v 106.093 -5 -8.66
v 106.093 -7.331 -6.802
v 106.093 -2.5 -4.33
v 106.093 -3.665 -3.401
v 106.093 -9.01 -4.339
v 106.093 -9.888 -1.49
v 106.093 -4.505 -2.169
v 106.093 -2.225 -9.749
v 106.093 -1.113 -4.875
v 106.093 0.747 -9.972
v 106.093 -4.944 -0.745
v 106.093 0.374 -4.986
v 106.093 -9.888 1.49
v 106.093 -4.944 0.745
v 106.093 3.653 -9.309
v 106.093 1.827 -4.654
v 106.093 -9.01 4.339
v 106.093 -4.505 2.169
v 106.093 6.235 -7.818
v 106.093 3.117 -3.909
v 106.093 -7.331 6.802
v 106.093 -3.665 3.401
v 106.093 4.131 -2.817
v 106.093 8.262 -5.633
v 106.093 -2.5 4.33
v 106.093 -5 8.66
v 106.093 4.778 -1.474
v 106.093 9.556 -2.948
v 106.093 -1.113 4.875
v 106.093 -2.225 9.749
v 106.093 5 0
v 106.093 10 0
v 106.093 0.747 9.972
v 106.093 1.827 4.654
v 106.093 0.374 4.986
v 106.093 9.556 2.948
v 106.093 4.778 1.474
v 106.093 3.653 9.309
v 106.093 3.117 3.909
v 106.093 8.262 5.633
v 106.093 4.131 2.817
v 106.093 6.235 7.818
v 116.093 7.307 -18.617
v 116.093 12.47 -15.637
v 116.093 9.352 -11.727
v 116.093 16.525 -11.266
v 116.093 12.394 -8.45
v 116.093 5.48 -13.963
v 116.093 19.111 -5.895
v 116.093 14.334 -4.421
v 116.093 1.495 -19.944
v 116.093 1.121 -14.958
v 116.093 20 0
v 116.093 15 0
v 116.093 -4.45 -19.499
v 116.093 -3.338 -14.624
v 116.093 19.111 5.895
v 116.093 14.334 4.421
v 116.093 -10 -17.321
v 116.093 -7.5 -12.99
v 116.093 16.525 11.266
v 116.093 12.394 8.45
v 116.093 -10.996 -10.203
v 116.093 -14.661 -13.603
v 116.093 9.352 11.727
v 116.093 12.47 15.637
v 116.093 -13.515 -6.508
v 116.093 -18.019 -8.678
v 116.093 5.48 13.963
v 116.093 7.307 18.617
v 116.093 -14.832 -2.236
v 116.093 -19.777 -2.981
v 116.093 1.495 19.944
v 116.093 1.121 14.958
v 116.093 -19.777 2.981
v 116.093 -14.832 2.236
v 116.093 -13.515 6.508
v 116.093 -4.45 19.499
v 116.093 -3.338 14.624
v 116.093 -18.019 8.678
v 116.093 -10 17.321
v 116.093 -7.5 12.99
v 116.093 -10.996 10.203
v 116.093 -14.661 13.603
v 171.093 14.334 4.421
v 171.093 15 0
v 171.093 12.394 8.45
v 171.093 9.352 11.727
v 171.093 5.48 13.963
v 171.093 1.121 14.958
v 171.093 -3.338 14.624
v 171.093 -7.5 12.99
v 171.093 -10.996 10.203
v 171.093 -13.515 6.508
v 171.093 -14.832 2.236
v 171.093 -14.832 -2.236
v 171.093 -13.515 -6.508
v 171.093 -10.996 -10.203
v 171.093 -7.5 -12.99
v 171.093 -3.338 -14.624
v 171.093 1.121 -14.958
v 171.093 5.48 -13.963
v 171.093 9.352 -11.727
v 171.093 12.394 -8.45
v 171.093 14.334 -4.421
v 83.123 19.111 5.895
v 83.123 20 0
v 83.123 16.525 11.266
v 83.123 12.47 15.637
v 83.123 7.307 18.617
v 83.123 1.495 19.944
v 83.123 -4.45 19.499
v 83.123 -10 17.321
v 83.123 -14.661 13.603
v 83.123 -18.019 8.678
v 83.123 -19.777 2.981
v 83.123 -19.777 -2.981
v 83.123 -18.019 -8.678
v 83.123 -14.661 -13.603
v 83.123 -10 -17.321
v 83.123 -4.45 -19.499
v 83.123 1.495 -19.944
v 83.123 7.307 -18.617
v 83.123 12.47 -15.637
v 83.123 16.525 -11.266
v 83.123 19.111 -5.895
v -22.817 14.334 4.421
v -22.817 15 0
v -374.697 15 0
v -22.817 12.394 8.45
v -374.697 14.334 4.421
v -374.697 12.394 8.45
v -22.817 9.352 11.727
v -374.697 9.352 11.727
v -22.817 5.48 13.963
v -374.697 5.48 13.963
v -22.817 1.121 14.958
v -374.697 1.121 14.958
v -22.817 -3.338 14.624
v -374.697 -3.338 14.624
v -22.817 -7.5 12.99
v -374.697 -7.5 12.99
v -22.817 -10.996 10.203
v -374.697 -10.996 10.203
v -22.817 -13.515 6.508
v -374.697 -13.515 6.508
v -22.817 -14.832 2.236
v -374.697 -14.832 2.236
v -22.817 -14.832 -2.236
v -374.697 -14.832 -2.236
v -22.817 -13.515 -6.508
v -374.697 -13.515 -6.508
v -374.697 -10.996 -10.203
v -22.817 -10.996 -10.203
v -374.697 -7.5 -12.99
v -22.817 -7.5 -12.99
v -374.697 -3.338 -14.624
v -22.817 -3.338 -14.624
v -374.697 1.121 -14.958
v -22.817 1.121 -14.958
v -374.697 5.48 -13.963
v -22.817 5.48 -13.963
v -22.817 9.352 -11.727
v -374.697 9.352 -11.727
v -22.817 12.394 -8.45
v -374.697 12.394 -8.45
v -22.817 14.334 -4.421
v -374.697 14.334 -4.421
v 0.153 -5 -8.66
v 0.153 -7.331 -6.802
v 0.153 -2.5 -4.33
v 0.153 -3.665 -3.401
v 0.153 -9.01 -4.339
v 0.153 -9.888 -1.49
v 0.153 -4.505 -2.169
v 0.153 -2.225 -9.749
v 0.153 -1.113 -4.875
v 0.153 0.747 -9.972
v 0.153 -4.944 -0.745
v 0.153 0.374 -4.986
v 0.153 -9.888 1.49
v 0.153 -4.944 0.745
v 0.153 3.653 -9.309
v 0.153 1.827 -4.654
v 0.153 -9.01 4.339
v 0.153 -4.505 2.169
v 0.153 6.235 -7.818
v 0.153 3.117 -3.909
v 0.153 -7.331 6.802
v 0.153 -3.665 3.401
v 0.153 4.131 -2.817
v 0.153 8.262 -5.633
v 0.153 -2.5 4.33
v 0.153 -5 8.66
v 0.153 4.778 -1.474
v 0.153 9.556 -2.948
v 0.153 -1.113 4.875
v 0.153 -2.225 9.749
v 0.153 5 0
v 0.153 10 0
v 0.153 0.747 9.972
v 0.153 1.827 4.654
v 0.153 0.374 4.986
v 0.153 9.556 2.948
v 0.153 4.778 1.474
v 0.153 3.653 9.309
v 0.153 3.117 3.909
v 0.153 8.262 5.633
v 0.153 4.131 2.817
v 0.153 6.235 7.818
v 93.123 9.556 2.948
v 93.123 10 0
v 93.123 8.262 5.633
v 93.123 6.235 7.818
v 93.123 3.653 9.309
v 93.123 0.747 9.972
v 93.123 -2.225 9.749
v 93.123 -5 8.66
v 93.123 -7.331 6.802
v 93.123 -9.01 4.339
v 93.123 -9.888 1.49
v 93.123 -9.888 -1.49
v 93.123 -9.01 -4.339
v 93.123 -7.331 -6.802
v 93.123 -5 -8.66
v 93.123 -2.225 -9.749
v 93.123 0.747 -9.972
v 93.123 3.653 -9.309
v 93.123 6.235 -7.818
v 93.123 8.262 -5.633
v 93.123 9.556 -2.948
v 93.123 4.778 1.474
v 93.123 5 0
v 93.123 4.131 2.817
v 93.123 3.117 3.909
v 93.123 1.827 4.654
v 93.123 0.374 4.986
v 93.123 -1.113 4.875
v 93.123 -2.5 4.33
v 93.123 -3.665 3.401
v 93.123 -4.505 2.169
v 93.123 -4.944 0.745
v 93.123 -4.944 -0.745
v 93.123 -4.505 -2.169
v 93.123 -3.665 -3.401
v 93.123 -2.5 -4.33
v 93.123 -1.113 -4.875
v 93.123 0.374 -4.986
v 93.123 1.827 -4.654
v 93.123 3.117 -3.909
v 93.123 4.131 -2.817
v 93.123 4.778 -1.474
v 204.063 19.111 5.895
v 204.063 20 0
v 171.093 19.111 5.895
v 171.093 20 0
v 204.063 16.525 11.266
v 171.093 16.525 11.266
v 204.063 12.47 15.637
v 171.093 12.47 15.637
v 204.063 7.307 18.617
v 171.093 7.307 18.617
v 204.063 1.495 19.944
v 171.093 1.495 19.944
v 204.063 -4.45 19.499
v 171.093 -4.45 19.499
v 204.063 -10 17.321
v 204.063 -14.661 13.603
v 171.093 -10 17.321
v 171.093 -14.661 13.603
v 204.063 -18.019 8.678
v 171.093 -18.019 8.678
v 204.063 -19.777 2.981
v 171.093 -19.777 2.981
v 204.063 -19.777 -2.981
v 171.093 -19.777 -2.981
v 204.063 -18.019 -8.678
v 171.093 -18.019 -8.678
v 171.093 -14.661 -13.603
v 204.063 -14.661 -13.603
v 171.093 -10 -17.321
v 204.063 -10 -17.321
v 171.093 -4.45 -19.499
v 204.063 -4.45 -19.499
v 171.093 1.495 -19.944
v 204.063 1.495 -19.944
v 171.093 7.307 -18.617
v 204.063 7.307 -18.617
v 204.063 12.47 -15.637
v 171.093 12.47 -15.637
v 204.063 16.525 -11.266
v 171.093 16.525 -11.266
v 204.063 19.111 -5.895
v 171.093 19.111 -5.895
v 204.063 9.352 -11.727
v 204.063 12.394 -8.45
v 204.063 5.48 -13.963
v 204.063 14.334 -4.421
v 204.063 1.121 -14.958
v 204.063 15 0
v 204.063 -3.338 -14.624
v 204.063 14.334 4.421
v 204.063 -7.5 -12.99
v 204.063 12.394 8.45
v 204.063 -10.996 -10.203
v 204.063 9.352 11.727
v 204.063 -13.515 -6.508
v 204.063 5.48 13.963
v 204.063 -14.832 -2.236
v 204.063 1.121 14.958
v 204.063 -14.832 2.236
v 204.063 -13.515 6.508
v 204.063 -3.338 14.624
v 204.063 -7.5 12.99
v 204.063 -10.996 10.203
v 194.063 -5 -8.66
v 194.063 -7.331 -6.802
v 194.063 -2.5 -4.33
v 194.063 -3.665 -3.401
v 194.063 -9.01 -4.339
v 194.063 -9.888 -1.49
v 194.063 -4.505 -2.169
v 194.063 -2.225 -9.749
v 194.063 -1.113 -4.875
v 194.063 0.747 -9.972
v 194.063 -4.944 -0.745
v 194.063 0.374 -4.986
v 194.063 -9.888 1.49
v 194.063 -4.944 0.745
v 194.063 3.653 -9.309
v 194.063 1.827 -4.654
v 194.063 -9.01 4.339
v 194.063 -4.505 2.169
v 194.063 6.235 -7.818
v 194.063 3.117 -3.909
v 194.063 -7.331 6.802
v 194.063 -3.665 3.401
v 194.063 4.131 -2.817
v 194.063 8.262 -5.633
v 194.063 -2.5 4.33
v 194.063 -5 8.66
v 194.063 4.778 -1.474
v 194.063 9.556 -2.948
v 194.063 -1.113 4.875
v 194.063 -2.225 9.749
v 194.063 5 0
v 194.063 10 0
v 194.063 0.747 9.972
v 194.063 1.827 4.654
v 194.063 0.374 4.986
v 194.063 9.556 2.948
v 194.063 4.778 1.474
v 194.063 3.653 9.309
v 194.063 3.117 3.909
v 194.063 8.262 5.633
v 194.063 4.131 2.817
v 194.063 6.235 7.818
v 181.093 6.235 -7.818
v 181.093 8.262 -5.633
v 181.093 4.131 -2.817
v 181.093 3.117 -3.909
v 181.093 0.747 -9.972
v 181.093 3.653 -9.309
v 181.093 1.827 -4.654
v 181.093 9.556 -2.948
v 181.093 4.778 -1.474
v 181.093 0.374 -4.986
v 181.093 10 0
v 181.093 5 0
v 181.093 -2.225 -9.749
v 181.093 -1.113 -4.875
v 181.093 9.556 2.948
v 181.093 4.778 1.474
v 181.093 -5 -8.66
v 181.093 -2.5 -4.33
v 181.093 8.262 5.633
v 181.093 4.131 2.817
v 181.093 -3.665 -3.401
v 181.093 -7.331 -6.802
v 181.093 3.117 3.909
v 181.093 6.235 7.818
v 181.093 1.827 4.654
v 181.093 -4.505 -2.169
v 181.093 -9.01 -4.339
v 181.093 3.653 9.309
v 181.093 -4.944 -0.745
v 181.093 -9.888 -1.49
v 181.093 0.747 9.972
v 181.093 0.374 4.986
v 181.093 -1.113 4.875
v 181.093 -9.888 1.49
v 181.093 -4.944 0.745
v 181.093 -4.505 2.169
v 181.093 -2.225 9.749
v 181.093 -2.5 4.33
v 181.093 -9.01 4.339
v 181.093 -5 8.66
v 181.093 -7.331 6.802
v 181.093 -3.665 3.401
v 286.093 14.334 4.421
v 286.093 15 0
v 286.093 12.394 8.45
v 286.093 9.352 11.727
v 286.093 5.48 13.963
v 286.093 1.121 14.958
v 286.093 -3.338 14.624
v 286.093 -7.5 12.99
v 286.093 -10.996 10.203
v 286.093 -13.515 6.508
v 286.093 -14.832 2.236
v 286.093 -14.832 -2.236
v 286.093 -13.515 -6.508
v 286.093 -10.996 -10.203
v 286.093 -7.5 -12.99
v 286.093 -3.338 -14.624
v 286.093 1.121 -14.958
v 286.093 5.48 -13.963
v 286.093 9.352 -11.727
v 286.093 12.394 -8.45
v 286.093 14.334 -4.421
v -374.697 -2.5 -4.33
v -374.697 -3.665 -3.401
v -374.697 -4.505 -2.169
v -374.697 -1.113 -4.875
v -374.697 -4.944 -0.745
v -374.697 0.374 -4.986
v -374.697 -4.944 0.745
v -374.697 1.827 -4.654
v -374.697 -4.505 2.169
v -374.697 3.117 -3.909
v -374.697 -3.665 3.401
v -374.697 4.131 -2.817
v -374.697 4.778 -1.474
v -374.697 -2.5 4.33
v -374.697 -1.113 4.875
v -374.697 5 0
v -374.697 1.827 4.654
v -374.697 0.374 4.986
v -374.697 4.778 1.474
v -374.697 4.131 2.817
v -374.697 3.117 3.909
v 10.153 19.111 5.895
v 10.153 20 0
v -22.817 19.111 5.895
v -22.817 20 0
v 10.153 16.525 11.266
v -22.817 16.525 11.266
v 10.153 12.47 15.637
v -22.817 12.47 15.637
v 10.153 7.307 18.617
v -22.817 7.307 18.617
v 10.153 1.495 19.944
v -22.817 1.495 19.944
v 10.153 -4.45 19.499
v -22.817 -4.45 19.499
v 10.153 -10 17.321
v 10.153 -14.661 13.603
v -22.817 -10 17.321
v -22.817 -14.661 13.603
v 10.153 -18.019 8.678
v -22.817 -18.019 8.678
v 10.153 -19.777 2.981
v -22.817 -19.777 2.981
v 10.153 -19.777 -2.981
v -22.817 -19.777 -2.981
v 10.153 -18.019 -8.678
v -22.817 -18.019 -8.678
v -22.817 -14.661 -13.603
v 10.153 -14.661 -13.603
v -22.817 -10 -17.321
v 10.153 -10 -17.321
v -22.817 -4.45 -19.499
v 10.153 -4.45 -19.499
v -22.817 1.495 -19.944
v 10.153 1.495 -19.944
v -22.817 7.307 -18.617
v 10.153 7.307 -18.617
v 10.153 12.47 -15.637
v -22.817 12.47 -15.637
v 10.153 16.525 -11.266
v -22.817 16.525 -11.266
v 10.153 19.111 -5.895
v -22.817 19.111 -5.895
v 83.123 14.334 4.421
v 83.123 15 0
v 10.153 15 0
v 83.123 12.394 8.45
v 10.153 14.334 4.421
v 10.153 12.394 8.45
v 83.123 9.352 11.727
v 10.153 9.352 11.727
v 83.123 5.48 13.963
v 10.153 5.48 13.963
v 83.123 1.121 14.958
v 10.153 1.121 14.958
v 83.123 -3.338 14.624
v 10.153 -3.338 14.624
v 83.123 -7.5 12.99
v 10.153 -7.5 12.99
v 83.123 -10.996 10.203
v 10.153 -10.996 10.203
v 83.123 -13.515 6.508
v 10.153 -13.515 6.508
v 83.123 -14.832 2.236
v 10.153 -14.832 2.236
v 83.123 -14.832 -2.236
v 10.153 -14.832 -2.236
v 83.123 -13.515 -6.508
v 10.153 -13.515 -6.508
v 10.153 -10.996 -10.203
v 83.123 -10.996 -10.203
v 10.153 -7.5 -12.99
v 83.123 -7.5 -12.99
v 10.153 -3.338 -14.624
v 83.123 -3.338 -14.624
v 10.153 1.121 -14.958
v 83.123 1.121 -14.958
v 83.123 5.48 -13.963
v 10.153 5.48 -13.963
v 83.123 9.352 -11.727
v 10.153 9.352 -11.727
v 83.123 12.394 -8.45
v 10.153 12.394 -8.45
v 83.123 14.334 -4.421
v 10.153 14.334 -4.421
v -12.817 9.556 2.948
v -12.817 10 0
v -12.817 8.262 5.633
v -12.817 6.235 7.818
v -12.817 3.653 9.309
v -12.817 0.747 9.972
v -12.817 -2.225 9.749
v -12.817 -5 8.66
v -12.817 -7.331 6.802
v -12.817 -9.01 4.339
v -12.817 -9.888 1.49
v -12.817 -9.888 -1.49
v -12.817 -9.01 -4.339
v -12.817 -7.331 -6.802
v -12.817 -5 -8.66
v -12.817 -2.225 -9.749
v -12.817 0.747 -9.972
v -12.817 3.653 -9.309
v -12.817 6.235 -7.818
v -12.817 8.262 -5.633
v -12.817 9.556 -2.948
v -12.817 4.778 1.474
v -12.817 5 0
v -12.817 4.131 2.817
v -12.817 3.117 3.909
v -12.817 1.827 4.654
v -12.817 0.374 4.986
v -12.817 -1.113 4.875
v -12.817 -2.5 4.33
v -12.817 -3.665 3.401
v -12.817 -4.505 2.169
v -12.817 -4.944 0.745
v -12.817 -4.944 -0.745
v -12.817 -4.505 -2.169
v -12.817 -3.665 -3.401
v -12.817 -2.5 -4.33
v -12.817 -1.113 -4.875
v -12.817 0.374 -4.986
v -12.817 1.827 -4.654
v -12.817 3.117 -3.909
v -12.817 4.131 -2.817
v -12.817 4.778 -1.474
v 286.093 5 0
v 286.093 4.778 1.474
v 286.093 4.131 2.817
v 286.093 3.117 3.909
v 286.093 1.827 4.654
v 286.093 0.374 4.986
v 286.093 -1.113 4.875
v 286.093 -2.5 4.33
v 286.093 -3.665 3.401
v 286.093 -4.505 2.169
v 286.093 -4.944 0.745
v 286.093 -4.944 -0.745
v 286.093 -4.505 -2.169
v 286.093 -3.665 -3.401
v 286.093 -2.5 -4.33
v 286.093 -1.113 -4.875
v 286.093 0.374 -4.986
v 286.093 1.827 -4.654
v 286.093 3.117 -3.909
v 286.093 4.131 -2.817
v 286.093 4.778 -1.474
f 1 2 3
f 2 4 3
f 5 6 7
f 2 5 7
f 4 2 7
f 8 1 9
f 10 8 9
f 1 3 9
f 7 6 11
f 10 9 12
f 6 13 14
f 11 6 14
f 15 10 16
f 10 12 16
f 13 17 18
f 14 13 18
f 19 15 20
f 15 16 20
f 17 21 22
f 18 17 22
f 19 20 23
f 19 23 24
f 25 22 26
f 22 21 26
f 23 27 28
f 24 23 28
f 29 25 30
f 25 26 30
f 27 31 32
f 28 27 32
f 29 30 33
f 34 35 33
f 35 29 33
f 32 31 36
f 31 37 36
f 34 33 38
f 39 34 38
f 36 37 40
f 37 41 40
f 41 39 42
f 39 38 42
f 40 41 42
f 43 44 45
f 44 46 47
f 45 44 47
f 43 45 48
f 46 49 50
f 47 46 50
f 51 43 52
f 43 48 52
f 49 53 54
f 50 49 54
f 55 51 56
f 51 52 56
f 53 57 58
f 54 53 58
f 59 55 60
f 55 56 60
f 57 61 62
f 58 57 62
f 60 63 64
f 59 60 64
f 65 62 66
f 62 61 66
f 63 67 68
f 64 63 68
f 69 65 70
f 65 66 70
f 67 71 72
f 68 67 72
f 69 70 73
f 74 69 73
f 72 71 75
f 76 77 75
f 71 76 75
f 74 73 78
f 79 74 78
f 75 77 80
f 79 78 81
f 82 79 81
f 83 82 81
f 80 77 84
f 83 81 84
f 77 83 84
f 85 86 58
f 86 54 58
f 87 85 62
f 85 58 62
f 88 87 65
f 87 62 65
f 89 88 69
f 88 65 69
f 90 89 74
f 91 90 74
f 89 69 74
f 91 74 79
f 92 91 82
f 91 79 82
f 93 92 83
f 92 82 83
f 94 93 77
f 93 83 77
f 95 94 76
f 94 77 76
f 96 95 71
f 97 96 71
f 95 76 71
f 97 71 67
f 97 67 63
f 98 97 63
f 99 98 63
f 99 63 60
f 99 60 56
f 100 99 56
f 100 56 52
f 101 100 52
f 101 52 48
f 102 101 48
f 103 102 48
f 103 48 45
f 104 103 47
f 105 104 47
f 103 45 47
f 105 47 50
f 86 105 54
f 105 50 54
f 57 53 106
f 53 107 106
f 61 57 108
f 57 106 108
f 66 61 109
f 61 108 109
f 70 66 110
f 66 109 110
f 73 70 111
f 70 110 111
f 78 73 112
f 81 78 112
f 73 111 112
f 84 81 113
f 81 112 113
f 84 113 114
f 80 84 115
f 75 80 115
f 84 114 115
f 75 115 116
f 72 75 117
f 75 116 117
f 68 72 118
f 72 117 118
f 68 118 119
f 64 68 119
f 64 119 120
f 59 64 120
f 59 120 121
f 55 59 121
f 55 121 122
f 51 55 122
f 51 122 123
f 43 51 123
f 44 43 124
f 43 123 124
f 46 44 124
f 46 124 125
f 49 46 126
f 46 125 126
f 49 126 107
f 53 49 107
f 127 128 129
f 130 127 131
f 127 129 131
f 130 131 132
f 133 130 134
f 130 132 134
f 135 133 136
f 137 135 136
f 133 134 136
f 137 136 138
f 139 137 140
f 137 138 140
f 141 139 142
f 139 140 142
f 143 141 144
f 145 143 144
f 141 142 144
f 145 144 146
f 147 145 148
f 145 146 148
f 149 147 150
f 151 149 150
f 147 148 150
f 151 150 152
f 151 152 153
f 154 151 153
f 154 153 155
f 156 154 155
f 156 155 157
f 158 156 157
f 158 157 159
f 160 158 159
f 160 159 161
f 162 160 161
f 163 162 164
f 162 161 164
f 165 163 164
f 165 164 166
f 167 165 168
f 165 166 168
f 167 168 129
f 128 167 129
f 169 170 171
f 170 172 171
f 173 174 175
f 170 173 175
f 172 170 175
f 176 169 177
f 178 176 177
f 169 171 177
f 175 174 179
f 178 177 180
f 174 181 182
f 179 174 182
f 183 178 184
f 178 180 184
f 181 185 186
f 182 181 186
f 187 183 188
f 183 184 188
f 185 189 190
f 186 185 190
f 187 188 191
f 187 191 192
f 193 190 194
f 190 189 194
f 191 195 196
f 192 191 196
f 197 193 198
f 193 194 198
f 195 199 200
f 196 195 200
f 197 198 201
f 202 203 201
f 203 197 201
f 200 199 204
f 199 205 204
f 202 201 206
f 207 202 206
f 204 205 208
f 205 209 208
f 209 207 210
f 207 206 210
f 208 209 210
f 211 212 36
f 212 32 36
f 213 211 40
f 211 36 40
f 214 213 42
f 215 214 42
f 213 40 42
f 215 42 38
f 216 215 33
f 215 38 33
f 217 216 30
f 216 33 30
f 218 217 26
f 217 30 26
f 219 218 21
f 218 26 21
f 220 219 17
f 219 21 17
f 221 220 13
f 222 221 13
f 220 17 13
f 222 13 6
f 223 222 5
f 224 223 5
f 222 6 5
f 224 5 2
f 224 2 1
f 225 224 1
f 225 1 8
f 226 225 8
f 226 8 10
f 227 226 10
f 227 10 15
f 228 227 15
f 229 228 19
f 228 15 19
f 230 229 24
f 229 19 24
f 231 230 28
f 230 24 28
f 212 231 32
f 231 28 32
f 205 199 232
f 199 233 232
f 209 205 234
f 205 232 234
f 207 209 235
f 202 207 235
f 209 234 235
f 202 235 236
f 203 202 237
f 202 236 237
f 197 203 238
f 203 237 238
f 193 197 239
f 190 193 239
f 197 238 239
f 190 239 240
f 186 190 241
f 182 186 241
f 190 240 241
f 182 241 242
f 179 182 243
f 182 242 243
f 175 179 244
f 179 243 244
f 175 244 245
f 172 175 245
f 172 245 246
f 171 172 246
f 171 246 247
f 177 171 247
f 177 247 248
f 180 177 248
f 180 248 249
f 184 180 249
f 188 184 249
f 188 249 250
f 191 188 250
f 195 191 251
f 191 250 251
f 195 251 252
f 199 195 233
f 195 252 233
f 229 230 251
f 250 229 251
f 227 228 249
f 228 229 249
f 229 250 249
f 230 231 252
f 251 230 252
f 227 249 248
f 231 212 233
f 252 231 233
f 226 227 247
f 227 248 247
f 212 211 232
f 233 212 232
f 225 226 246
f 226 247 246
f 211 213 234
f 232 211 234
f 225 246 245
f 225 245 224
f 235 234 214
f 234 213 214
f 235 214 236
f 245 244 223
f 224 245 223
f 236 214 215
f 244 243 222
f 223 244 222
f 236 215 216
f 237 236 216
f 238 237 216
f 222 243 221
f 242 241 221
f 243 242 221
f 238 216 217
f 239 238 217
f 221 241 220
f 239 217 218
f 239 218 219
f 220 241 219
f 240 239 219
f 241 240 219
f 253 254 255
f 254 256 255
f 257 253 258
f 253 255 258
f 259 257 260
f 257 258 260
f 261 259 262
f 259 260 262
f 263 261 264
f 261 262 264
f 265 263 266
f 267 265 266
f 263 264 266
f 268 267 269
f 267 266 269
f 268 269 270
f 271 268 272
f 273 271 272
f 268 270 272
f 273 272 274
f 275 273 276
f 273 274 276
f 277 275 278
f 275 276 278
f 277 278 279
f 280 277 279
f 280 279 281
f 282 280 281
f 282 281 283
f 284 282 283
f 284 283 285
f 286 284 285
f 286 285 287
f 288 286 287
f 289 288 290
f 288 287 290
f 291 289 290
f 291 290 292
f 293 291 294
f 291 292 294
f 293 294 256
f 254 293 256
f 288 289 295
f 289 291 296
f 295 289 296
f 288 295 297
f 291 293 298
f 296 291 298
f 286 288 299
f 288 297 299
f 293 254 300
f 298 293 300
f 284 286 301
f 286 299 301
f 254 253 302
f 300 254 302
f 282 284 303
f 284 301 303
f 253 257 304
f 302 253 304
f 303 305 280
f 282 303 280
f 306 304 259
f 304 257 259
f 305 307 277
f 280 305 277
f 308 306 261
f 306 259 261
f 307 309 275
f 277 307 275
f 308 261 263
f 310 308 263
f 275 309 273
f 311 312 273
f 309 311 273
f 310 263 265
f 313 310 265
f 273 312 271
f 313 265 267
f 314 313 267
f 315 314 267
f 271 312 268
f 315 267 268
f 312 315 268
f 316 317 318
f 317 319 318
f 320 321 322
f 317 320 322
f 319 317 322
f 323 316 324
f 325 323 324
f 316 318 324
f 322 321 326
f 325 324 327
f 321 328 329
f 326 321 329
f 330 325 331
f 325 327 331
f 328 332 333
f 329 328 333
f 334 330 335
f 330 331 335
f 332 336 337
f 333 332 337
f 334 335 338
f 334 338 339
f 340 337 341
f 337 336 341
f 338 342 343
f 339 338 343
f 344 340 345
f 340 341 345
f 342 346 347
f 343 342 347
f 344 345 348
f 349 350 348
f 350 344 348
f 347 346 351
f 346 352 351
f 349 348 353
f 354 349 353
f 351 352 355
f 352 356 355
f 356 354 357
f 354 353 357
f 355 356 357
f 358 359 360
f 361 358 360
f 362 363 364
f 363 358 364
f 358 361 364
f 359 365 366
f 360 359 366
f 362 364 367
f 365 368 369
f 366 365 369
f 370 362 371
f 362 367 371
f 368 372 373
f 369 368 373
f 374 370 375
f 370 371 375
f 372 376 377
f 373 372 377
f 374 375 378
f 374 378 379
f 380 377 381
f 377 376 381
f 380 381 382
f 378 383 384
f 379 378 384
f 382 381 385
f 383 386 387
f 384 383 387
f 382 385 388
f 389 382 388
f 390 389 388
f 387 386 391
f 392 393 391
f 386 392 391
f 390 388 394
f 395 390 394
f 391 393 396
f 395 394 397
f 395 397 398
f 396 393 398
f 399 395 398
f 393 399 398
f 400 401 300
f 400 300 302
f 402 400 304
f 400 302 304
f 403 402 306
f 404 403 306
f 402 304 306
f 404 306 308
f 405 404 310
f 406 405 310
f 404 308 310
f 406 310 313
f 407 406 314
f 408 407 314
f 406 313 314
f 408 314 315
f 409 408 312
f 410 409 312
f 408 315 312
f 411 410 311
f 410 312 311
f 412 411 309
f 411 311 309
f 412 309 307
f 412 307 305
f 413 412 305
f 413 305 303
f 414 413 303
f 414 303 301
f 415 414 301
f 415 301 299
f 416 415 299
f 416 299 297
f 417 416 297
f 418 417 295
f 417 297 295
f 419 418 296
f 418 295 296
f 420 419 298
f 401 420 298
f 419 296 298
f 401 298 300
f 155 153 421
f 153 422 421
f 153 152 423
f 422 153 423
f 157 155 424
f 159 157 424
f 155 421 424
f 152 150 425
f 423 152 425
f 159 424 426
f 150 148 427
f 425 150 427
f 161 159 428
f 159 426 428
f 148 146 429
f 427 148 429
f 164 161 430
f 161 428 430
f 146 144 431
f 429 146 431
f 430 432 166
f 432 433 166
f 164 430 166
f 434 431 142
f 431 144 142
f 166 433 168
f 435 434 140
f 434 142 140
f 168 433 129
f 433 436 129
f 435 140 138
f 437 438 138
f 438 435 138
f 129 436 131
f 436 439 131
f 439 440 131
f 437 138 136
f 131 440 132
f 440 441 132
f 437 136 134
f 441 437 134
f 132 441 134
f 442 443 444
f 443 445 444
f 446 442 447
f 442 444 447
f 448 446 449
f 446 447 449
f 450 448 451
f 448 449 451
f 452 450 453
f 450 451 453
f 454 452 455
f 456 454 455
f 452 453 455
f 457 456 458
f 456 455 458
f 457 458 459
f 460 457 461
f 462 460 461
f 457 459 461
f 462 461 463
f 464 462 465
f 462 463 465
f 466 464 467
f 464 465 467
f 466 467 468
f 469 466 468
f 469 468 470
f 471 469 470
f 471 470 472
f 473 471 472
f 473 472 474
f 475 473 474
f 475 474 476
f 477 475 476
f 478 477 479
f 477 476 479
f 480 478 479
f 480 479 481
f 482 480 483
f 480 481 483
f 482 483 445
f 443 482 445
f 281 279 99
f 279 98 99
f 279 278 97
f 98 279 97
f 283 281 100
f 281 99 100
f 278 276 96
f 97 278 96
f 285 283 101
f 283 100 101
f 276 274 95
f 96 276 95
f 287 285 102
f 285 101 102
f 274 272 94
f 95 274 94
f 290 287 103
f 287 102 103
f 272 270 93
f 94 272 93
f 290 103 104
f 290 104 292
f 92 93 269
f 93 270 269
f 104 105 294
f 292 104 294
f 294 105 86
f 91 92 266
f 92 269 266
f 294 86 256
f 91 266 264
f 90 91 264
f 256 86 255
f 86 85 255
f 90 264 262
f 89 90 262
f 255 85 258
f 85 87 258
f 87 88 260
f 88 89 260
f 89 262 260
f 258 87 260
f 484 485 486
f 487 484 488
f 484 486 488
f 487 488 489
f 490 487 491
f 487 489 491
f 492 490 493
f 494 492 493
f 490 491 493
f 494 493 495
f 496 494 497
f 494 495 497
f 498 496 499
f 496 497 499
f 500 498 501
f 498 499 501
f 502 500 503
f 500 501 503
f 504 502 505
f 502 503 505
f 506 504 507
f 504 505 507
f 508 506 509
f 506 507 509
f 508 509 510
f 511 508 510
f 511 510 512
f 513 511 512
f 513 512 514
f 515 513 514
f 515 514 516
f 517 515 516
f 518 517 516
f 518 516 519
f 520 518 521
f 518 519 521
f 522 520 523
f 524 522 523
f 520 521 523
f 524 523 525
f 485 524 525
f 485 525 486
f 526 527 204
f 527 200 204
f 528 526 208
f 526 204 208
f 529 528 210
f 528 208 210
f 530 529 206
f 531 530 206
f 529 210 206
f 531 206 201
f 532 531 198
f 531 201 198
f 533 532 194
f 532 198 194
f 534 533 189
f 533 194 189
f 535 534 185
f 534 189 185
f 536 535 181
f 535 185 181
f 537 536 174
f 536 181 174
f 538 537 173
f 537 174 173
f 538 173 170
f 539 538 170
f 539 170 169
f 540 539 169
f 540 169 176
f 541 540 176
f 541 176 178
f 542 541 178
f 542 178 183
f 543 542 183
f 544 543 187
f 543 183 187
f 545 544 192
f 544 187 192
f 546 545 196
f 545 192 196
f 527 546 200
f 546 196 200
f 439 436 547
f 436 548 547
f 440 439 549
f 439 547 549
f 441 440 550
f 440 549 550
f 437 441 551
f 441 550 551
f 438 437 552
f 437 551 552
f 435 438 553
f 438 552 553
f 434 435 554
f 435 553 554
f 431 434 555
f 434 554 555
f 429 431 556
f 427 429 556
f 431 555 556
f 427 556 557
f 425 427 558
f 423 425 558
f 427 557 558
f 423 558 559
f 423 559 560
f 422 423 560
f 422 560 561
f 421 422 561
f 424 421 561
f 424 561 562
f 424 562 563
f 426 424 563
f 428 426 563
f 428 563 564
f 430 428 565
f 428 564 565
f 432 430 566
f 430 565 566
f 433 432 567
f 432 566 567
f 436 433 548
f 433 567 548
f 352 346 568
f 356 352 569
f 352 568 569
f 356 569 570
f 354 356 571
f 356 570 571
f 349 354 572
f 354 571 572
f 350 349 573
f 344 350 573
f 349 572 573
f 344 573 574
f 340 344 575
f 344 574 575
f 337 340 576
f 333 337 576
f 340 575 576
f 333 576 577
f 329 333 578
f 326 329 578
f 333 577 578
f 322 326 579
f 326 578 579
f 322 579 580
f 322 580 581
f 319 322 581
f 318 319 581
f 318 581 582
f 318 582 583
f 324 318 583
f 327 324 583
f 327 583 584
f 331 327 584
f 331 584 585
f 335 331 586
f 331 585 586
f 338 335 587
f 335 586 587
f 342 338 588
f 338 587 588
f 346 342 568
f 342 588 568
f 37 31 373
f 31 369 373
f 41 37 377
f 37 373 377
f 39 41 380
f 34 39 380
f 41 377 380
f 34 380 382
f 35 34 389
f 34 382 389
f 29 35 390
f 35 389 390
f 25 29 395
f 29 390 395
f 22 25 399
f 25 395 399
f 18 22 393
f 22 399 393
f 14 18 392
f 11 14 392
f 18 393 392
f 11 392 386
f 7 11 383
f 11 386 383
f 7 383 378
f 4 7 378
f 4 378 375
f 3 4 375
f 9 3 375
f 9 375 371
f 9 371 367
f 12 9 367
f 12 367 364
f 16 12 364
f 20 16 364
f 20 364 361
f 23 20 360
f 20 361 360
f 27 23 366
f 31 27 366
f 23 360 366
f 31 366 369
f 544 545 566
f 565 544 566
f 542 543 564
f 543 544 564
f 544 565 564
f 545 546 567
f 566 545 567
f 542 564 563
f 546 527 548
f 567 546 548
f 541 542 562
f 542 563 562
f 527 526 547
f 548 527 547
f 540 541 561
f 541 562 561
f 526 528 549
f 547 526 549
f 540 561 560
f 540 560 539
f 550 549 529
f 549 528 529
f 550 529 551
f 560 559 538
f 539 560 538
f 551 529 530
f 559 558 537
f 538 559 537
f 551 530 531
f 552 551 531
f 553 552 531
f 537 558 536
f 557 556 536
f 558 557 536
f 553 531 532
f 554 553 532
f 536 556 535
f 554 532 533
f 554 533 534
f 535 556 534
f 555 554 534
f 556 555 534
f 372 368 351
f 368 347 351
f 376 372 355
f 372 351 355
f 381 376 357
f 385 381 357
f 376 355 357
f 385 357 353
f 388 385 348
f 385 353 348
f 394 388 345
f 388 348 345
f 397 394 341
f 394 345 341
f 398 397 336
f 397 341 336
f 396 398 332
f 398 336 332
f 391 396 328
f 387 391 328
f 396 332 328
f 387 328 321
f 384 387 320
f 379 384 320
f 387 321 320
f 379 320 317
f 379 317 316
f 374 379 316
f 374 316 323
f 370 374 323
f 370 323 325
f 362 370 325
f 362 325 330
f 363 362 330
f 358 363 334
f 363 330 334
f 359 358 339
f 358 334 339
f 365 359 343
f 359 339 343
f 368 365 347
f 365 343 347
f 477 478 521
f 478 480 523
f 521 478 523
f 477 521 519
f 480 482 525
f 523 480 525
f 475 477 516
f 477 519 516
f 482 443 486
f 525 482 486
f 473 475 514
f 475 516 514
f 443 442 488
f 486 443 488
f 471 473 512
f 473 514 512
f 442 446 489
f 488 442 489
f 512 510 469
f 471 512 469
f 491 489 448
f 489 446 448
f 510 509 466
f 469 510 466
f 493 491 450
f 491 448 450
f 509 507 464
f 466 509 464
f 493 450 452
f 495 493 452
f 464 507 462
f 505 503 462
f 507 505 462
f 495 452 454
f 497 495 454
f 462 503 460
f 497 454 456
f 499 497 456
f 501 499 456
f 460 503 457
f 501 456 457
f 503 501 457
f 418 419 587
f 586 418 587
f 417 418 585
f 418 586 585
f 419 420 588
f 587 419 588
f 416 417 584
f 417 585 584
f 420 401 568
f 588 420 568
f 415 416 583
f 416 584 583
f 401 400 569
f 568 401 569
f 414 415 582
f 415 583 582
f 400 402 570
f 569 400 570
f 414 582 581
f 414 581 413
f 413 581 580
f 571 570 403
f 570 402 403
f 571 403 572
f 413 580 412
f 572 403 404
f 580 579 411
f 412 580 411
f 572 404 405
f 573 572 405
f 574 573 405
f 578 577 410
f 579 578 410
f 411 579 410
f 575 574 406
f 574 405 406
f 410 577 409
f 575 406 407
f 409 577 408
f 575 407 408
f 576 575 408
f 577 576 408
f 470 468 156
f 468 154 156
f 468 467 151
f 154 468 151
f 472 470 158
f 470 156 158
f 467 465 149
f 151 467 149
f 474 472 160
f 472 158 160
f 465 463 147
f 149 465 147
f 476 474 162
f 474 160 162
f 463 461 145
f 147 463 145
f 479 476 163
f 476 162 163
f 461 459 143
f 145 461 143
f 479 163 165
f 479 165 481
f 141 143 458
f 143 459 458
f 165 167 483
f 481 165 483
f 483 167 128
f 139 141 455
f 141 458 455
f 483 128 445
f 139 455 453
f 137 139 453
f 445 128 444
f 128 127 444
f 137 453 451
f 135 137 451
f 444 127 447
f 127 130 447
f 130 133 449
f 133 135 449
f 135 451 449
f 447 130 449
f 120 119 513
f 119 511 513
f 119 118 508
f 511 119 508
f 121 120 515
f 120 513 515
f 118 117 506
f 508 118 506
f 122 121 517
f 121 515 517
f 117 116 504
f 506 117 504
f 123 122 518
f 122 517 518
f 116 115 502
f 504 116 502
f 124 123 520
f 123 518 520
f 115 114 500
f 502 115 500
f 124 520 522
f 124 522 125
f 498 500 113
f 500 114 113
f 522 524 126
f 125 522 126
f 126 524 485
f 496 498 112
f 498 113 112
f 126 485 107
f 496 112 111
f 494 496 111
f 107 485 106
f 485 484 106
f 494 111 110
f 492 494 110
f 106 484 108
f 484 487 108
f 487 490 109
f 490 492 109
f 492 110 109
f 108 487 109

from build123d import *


with BuildPart() as part:
    # Sketch1 → Revolve-Thin1 (revolve)
    with BuildSketch(Plane.XY):
        Polygon((286.093493363, 15), (204.063493363, 15), (204.063493363, 20), (171.093493363, 20), (171.093493363, 15), (116.093493363, 15), (116.093493363, 20), (83.123493363, 20), (83.123493363, 15), (10.153493363, 15), (10.153493363, 20), (-22.816506637, 20), (-22.816506637, 15), (-143.276508184, 15), (-374.696506637, 15), (-374.696506637, 5), (-143.276508184, 5), (-12.816506637, 5), (-12.816506637, 10), (0.153493363, 10), (0.153493363, 5), (93.123493363, 5), (93.123493363, 10), (106.093493363, 10), (106.093493363, 5), (181.093493363, 5), (181.093493363, 10), (194.063493363, 10), (194.063493363, 5), (286.093493363, 5), align=None)
    revolve(axis=Axis((-141.82946491, 0, 0), (1, 0, 0)))


solid = part.part
